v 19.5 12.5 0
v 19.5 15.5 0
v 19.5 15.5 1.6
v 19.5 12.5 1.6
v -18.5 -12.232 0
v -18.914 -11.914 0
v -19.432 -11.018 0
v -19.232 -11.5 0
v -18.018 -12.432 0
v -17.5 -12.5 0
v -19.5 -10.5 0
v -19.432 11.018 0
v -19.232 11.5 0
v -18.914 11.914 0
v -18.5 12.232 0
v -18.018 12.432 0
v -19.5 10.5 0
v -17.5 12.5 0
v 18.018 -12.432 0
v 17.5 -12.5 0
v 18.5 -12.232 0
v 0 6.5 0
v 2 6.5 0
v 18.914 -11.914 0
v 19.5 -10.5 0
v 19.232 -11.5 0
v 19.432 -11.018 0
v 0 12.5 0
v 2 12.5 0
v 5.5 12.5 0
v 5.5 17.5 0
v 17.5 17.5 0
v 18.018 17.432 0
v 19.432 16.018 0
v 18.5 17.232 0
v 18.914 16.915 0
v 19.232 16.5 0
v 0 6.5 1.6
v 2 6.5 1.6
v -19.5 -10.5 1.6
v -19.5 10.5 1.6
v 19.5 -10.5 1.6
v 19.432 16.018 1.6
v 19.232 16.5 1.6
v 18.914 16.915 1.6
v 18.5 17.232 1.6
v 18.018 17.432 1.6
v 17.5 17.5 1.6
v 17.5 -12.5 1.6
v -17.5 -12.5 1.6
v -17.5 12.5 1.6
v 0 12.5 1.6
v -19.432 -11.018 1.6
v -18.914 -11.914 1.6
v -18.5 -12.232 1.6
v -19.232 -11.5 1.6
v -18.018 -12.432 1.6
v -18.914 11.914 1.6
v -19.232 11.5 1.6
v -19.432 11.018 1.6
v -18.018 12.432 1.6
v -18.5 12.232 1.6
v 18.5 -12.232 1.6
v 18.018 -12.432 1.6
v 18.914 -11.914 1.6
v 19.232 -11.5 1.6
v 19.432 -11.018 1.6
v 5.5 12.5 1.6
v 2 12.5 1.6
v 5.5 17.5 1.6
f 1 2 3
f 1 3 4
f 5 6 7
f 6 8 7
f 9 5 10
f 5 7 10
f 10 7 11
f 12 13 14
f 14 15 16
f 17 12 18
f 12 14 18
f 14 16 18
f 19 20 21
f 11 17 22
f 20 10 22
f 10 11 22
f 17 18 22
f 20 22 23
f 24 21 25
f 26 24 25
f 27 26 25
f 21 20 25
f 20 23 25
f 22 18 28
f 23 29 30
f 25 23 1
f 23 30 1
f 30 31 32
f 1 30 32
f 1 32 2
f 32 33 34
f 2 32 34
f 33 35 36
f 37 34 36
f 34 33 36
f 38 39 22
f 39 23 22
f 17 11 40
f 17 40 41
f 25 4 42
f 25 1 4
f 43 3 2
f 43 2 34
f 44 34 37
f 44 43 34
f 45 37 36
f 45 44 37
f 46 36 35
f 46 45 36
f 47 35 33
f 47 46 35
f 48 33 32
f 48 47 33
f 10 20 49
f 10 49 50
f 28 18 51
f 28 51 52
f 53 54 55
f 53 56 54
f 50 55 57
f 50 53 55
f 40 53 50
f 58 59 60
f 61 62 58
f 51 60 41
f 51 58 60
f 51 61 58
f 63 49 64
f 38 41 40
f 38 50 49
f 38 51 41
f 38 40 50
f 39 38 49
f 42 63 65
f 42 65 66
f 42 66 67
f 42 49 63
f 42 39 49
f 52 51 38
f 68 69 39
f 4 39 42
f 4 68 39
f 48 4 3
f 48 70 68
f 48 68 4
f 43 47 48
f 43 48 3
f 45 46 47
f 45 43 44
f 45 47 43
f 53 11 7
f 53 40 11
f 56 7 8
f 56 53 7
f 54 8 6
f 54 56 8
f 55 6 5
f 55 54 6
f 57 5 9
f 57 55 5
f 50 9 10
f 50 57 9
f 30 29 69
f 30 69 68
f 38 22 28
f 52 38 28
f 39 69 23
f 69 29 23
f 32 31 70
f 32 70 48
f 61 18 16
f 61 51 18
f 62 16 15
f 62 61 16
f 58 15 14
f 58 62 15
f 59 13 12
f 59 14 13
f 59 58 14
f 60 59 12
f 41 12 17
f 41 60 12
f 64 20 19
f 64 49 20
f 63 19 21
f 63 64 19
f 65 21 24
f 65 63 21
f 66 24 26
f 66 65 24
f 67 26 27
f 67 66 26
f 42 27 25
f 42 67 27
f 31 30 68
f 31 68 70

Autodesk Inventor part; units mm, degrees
ref_plane "YZ Plane" through (0, 0, 0) normal (1, 0, 0) x (0, 1, 0)
ref_plane "XZ Plane" through (0, 0, 0) normal (0, 1, 0) x (-1, 0, 0)
ref_plane "XY Plane" through (0, 0, 0) normal (0, 0, 1) x (1, 0, 0)
sketch "Sketch6" plane through (0, 0, 0) normal (0, 0, 1) x (1, 0, 0)
  line L0 (19.5, -12.4999) -> (-19.5, -12.4999)
  line L1 (-19.5, -12.4999) -> (-19.5, 12.4999)
  line L2 (19.5, 12.4999) -> (19.5, -12.4999)
  line L3 (19.5, -12.4999) -> (-19.5, 12.4999) construction
  line L4 (-19.5, -12.4999) -> (19.5, 12.4999) construction
  line L5 (5.4997, 12.4999) -> (5.4997, 17.5003)
  line L6 (5.4997, 17.5003) -> (19.5, 17.5003)
  line L7 (19.5, 17.5003) -> (19.5, 12.4999)
  line L8 (1.9998, 6.5001) -> (0.0002, 6.5001)
  line L9 (0.0002, 6.5001) -> (0.0002, 12.4999)
  line L10 (1.9998, 12.4999) -> (1.9998, 6.5001)
  line L11 (1.9998, 6.5001) -> (0.0002, 12.4999) construction
  line L12 (0.0002, 6.5001) -> (1.9998, 12.4999) construction
  line L13 (-19.5, 12.4999) -> (0.0002, 12.4999)
  line L14 (1.9998, 12.4999) -> (5.4997, 12.4999)
extrude "Extrusion5" add sketch "Sketch6" along normal blind 1.6
fillet "Fillet5" radius 2 4 edges at (19.5, 17.5003, 0.8) (-19.5, 12.4999, 0.8) (-19.5, -12.4999, 0.8) (19.5, -12.4999, 0.8)
properties part number "pcb_balun_bottom"
